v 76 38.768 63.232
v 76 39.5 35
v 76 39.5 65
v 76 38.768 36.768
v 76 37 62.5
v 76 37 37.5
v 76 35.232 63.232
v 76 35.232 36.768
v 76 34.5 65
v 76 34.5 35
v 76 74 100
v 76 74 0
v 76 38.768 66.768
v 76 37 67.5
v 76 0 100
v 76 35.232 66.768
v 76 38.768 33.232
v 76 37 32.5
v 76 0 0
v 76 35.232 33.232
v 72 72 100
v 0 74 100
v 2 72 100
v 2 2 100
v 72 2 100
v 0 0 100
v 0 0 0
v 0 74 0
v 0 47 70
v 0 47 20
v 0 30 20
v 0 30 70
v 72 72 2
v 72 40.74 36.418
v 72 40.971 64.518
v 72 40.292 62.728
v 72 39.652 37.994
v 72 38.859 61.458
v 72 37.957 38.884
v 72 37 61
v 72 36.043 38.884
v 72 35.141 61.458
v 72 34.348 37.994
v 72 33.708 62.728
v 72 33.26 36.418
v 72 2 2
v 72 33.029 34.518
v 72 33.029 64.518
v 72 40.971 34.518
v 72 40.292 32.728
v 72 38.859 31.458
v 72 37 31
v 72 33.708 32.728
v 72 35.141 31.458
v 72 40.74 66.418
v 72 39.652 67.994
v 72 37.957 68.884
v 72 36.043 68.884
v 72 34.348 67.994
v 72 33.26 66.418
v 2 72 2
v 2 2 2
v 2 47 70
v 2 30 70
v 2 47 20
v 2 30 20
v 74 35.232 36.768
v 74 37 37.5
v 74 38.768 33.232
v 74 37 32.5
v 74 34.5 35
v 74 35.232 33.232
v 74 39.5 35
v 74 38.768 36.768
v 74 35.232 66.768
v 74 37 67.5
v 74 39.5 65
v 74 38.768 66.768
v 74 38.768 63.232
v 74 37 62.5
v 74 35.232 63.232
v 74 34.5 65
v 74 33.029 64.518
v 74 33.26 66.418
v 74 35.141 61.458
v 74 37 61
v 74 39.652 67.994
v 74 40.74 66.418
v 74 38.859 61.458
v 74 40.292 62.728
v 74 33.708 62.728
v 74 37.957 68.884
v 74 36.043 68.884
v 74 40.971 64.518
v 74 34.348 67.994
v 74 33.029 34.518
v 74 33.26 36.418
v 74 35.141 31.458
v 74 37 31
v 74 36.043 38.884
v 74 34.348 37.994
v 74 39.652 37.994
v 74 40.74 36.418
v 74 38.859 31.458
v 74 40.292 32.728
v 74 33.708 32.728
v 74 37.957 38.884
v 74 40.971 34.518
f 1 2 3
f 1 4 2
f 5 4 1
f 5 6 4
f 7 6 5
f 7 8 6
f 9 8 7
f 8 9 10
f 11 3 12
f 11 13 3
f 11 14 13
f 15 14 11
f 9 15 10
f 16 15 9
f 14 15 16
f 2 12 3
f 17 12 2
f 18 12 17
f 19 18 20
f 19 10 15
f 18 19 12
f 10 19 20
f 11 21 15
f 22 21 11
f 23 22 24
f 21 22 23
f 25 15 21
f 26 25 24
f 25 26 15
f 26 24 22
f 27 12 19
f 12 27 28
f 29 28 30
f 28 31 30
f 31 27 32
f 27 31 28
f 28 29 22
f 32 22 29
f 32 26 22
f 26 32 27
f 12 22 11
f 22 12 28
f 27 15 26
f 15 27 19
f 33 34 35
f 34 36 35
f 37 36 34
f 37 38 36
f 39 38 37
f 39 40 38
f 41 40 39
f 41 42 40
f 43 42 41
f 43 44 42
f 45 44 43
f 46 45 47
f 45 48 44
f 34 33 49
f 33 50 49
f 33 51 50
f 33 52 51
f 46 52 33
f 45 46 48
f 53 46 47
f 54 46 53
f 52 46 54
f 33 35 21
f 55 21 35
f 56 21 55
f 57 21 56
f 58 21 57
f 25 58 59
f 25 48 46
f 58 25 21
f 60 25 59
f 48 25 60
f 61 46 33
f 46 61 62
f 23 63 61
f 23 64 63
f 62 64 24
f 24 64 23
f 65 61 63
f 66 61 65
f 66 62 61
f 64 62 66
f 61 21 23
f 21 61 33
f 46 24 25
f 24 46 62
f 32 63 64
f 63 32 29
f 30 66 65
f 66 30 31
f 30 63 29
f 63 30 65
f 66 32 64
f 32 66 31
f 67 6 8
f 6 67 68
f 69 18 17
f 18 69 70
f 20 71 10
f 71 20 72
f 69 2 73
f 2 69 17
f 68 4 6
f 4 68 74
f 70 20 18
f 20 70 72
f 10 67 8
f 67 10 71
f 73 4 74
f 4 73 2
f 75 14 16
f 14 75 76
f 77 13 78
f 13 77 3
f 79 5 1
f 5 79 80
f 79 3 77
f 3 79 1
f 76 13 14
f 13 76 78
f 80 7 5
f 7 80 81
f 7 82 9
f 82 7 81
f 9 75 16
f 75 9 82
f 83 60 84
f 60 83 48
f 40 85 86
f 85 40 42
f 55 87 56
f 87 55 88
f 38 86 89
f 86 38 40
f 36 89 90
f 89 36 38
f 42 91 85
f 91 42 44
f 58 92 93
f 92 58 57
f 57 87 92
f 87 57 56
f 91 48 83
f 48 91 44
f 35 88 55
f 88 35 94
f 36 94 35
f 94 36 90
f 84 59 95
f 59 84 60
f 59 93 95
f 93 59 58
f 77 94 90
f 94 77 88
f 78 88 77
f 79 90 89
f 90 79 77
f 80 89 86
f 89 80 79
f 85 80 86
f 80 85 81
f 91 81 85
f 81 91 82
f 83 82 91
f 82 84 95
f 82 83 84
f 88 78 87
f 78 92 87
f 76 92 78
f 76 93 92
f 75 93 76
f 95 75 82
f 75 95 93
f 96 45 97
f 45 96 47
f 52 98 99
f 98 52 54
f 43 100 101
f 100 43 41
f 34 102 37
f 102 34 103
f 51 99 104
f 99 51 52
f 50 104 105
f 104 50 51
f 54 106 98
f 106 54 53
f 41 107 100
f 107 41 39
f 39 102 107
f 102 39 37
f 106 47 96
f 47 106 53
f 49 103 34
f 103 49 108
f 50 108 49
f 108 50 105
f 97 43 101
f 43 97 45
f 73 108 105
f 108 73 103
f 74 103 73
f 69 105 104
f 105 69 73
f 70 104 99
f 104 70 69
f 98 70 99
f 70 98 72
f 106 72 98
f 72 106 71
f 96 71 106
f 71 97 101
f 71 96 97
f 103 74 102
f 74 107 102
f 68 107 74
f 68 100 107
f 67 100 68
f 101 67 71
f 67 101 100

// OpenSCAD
difference()
{
    cube([76,74,100]);
    translate([2,2,2]) cube([70,70,110]);
    translate([-2,30,20]) cube([10,17,50]);
    translate([65,37,35]) rotate([0,90,0]) cylinder(h=15,d=5);
    translate([65,37,65]) rotate([0,90,0]) cylinder(h=15,d=5);
    translate([71,37,65]) rotate([0,90,0]) cylinder(h=3,d=8);
    translate([71,37,35]) rotate([0,90,0]) cylinder(h=3,d=8);
}
